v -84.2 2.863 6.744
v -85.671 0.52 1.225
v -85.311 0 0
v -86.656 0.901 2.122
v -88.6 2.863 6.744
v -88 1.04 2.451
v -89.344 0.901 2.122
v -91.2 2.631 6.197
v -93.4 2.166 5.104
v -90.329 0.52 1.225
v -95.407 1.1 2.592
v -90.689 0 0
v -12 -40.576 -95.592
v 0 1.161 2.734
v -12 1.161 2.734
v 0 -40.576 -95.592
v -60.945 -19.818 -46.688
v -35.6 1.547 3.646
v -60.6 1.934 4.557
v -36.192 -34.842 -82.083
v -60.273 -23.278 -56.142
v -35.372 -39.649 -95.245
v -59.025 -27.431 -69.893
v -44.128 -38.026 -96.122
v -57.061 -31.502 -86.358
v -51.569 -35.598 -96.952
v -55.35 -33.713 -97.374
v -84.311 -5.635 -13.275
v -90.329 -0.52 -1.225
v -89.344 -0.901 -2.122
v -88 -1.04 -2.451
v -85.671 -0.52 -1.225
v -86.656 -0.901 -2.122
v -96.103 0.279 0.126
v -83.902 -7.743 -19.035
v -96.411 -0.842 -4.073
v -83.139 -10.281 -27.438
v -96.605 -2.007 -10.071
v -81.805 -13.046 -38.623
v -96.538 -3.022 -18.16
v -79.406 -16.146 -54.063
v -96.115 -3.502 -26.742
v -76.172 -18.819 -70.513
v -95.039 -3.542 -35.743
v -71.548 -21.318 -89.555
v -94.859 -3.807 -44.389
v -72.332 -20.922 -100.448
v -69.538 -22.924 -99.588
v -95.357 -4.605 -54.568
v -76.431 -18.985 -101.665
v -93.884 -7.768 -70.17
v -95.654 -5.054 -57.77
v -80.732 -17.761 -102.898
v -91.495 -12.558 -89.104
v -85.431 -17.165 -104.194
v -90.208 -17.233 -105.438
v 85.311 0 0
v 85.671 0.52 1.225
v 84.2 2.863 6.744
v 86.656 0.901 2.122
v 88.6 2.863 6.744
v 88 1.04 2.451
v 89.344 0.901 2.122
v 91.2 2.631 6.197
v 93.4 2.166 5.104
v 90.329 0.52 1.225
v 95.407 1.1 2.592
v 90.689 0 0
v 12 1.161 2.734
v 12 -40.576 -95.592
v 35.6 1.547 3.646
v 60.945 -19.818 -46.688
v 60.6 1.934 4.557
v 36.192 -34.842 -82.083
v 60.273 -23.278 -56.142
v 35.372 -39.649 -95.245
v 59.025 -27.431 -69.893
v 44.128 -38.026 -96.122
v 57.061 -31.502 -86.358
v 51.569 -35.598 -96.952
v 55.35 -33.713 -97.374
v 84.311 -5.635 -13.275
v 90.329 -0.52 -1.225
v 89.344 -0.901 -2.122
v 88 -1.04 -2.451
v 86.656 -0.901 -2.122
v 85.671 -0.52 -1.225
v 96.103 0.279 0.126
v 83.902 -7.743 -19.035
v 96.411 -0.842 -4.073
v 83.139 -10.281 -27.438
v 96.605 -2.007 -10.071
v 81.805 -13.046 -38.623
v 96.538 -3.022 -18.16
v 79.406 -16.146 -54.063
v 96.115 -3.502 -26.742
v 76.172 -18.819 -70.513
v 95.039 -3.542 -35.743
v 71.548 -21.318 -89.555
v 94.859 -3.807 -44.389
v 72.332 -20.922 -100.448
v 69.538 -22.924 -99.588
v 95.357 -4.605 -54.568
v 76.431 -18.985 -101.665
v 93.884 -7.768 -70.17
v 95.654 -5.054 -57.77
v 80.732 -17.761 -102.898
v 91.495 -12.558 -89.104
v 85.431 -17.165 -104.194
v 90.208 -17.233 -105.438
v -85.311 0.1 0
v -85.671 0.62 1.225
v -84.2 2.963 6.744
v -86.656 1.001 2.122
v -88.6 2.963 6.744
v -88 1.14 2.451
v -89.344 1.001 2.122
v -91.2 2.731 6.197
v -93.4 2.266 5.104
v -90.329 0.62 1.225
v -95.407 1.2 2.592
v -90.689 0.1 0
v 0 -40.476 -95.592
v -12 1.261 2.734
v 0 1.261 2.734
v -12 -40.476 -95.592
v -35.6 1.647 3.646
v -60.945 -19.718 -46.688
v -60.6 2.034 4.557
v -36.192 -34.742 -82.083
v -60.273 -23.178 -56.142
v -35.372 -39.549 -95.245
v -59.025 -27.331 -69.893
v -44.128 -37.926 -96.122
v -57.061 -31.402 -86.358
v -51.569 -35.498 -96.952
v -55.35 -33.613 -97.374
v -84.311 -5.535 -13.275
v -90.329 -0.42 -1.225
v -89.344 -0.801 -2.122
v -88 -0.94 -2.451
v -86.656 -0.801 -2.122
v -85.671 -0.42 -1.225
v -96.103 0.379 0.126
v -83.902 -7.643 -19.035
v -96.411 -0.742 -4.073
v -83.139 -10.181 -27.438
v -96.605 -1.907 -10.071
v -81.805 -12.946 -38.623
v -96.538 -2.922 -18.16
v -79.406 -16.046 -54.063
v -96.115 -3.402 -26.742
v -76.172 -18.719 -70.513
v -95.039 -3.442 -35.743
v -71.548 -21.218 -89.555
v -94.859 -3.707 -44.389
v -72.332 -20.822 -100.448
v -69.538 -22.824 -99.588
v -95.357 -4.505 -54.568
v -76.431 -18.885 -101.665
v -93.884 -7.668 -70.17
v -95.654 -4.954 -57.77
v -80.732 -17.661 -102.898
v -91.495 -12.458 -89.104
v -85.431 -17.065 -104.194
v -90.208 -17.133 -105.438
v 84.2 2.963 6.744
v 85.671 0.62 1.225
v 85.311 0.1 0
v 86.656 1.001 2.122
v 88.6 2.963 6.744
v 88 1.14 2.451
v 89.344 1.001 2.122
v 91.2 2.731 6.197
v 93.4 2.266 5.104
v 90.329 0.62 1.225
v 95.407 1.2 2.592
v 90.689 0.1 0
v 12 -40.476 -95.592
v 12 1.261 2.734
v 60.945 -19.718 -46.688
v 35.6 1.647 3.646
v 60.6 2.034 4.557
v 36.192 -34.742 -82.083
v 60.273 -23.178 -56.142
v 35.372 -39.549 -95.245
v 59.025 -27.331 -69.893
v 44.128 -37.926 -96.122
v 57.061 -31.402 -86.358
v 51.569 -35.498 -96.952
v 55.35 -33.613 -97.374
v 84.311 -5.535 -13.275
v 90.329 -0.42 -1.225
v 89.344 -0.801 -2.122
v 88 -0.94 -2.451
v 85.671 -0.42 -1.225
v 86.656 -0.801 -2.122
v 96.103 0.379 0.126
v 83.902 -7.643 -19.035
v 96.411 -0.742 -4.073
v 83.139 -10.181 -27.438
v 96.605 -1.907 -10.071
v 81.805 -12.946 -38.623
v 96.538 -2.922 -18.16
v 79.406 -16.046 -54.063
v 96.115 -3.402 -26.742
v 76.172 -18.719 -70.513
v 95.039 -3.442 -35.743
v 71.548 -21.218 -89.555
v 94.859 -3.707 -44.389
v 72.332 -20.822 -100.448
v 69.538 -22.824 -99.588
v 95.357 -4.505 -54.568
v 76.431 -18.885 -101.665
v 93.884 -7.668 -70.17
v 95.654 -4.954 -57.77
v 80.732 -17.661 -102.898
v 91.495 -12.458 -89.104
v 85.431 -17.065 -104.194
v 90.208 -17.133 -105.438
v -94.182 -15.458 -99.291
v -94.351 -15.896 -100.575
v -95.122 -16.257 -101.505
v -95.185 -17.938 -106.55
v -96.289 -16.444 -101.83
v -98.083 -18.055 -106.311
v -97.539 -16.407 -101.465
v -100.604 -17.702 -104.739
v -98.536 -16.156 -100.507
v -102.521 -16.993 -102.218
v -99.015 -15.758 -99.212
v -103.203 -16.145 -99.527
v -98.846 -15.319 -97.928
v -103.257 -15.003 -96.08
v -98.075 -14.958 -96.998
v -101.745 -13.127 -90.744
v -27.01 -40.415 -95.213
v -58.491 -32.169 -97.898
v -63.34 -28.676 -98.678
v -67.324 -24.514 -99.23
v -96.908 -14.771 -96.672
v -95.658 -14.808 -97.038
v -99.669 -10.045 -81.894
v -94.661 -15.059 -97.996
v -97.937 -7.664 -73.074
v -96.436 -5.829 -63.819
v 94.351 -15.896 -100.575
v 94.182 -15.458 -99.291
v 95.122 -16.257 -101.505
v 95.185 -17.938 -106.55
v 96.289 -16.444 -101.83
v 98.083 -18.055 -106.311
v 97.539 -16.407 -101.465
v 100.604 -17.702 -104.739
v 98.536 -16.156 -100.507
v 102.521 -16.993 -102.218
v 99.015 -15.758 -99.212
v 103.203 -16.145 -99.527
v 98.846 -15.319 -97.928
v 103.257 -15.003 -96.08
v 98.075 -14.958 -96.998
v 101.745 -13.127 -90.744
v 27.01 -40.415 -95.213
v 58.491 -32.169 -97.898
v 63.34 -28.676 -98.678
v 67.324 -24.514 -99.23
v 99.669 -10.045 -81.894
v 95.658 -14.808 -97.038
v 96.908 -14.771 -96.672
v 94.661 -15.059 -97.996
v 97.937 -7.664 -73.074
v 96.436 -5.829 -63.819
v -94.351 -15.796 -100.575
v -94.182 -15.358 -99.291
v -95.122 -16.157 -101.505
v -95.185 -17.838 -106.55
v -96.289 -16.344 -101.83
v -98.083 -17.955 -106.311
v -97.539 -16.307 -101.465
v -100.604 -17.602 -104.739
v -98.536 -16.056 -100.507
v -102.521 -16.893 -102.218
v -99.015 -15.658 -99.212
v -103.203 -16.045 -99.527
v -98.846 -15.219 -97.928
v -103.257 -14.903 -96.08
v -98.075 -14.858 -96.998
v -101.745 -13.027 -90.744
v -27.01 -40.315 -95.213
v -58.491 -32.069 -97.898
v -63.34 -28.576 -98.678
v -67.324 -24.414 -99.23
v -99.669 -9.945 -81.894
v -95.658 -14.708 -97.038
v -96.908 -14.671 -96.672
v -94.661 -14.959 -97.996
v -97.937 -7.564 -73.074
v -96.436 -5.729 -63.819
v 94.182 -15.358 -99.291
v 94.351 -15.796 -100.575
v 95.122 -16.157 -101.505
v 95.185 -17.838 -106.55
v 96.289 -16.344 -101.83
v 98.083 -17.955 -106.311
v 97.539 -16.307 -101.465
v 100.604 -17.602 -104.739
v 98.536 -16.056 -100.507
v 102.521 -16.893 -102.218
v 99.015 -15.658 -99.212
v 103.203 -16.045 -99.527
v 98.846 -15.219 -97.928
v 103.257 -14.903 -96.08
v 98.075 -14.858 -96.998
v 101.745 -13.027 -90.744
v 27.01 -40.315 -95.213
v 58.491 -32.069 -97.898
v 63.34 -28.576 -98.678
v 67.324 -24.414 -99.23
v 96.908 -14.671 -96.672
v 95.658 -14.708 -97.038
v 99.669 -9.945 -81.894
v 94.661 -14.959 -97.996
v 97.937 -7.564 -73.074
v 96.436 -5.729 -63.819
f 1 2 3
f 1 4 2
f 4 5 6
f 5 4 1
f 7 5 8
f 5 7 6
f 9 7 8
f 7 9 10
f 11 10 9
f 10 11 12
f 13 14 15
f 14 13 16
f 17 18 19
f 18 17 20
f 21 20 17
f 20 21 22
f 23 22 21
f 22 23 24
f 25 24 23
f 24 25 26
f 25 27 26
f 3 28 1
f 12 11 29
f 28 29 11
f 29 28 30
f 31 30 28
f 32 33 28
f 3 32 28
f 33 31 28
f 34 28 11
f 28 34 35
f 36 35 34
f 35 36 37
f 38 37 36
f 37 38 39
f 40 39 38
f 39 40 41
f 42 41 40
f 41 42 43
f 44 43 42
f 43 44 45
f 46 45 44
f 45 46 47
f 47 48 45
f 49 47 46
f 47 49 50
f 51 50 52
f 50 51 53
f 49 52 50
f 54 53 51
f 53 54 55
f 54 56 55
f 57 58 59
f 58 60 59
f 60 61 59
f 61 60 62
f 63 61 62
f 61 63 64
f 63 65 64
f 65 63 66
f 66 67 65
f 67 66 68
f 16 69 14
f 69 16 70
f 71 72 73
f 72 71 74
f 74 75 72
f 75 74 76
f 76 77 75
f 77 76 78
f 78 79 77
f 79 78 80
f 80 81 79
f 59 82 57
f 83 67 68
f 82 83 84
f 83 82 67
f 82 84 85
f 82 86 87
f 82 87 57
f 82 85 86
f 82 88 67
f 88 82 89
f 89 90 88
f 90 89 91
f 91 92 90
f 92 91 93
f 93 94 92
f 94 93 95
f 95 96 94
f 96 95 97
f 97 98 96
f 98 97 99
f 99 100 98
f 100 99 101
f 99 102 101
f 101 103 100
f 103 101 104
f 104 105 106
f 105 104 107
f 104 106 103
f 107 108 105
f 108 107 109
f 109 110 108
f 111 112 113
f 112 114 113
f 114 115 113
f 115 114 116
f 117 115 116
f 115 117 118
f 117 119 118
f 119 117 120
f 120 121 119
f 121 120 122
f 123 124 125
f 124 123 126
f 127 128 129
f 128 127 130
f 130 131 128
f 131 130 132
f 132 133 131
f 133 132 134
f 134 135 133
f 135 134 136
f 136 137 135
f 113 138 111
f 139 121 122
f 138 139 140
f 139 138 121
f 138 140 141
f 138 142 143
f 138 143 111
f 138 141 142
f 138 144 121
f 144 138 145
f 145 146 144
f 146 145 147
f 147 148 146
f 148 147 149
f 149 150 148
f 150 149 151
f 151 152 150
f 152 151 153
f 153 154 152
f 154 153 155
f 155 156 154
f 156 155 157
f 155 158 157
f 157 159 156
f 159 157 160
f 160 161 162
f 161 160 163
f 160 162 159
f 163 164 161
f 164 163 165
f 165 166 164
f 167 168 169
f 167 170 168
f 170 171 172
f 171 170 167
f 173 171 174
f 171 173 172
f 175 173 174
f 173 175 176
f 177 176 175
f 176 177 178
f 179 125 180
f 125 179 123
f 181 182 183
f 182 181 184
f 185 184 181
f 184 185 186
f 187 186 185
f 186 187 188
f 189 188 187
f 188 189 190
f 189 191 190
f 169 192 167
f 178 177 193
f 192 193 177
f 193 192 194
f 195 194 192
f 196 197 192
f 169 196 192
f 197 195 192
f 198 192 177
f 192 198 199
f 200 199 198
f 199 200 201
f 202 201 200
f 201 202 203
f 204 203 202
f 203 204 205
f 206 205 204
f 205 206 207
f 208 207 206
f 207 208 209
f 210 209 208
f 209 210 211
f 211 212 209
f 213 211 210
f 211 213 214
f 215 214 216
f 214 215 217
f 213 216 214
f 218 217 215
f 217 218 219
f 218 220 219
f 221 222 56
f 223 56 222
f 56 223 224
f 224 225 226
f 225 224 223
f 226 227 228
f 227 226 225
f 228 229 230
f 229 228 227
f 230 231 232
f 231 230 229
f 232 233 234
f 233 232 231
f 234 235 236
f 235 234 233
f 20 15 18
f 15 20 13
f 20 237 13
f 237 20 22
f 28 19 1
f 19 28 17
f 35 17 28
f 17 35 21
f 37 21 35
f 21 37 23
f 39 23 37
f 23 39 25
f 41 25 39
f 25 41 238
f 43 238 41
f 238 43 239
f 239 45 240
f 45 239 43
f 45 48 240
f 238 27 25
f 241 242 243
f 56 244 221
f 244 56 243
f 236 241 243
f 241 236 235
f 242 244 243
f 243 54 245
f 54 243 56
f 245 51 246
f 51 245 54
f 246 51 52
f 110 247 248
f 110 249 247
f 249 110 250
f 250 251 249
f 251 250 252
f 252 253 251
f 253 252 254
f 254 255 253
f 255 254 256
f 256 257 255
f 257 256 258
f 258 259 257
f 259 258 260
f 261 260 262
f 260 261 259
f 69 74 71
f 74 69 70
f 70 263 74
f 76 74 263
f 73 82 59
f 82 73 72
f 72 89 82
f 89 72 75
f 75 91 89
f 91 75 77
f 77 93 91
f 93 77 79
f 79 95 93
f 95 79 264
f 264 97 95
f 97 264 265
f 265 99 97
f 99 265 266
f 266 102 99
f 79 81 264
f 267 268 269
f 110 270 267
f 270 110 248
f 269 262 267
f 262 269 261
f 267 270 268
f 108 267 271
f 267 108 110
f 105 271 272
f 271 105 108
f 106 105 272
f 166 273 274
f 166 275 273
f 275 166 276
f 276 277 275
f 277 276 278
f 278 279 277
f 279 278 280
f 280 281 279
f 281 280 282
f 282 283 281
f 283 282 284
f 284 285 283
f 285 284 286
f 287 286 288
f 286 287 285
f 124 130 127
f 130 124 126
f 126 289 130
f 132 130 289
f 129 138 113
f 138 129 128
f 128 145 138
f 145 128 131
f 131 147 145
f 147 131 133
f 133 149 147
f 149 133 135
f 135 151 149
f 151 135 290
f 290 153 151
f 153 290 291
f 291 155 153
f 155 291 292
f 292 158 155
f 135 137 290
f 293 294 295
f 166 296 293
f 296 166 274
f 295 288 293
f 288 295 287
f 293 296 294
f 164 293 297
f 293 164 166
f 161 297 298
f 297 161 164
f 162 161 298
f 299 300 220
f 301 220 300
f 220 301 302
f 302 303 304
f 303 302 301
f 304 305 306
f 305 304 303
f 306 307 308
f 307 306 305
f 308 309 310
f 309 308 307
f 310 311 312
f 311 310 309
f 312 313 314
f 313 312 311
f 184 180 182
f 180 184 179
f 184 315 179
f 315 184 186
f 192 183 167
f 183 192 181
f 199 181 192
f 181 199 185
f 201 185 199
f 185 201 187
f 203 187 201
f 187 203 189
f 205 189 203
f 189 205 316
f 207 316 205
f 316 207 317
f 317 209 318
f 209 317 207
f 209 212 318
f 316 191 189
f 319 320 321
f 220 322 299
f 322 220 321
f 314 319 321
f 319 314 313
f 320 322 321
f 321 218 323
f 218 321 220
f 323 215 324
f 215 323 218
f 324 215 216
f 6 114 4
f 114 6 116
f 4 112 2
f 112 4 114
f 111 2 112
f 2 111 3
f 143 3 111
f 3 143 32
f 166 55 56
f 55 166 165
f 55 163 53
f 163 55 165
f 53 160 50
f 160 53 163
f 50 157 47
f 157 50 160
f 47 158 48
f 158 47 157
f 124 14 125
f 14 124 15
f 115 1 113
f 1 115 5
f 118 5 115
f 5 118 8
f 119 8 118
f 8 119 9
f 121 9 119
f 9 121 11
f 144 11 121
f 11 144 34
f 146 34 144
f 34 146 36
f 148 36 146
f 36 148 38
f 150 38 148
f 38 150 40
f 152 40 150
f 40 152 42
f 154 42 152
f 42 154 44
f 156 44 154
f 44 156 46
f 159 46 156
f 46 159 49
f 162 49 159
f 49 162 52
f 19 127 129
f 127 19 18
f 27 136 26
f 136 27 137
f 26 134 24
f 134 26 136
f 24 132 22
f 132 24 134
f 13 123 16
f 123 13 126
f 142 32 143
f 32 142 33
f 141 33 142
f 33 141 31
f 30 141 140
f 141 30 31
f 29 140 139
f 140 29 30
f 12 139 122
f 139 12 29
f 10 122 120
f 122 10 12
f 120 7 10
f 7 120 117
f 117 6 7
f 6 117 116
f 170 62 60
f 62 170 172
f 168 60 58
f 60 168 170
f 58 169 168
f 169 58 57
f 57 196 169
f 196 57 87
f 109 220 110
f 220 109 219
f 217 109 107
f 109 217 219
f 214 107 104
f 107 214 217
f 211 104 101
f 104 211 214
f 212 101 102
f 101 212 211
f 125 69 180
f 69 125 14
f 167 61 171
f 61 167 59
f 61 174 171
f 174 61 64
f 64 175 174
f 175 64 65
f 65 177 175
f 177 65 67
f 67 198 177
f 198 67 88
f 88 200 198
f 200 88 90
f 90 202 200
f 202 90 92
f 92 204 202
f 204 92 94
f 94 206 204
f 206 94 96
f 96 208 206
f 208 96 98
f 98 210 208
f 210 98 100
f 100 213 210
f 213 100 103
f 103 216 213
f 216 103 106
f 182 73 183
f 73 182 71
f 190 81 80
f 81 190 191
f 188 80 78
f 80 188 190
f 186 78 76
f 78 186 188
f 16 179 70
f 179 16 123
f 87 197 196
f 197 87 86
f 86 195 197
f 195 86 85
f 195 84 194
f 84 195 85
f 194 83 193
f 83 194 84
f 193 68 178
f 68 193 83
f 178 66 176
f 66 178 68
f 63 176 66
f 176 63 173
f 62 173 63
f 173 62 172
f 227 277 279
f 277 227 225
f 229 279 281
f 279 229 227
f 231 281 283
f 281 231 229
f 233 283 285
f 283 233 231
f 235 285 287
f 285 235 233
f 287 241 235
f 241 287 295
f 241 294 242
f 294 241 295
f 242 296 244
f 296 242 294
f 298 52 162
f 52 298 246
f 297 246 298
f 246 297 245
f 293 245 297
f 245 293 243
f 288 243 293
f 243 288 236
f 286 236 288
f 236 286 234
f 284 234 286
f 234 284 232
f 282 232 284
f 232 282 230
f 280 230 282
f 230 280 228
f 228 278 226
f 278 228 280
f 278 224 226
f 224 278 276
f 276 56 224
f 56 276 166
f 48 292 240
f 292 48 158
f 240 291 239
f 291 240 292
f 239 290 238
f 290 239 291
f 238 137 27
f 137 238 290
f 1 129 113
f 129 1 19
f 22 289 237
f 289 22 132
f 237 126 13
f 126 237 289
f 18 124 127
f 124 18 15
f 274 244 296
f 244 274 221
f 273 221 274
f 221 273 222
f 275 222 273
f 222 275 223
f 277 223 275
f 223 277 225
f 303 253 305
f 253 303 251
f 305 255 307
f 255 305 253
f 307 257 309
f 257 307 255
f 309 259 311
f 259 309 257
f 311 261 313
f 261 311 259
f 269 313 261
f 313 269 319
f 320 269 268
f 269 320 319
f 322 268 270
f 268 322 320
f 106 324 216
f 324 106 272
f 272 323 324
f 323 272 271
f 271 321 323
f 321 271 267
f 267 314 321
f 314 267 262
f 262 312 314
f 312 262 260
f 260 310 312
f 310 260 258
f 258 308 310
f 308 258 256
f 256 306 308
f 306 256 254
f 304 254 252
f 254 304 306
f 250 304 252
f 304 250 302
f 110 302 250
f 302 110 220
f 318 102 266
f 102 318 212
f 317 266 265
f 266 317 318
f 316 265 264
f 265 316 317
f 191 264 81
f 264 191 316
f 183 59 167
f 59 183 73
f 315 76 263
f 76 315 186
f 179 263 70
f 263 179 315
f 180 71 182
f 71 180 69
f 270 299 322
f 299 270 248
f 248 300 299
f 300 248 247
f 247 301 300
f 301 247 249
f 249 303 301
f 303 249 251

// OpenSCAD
// file: ../p/rect2p.scad
use <../lib.scad>
function ldraw_lib__rect2p() = [
// 0 Rectangle with 2 Parallel Edges
// 0 Name: rect2p.dat
// 0 Author: Donald Sutter [technog]
// 0 !LDRAW_ORG Primitive UPDATE 2010-01
// 0 !LICENSE Licensed under CC BY 2.0 and CC BY 4.0 : see CAreadme.txt
// 
// 0 BFC CERTIFY CCW
  [0,"BFC","CERTIFY"],
  [0,"BFC","CCW"],
// 
// 0 !HISTORY 2003-08-01 [PTadmin] Official Update 2003-02
// 0 !HISTORY 2007-06-24 [PTadmin] Header formatted for Contributor Agreement
// 0 !HISTORY 2008-07-01 [PTadmin] Official Update 2008-01
// 0 !HISTORY 2010-01-17 [mikeheide] changed winding to CCW
// 0 !HISTORY 2010-04-05 [PTadmin] Official Update 2010-01
// 
// 
// 2 24 1 0 1 -1 0 1
  [2,24,1,0,1,-1,0,1],
// 2 24 -1 0 -1 1 0 -1
  [2,24,-1,0,-1,1,0,-1],
// 4 16 -1 0 1 -1 0 -1 1 0 -1 1 0 1
  [4,16,-1,0,1,-1,0,-1,1,0,-1,1,0,1],
// 0
];
module ldraw_lib__rect2p(step=0, col=false, unit=2/5, alt=false, line=0.2, solid=!$preview)
    makepoly(ldraw_lib__rect2p(), step=step, col=col, unit=unit, alt=alt, line=line, solid=solid);
ldraw_lib__rect2p(line=0.2);
// main file
use <../lib.scad>
use <s/u9495c02s01.scad>
use <s/u9495c02s02.scad>
use <s/u9495c02s03.scad>
use <s/u9495c02s04.scad>
function ldraw_lib__u9495c02() = [
// 0 Sail 30 x 15 Trapezoidal (Formed Shape 2)
// 0 Name: u9495c02.dat
// 0 Author: Philippe Hurbain [Philo]
// 0 !LDRAW_ORG Part UPDATE 2020-03
// 0 !LICENSE Licensed under CC BY 2.0 and CC BY 4.0 : see CAreadme.txt
// 
// 0 BFC CERTIFY CCW
  [0,"BFC","CERTIFY"],
  [0,"BFC","CCW"],
// 
// 0 !CATEGORY Sheet Fabric
// 
// 0 !HISTORY 2020-12-29 [PTadmin] Official Update 2020-03
// 
// 
// 1 16 0 0 0 1 0 0 0 1 0 0 0 1 s\u9495c02s01.dat
  [1,16,0,0,0,1,0,0,0,1,0,0,0,1, ldraw_lib__s__u9495c02s01()],
// 1 16 0 0 0 -1 0 0 0 1 0 0 0 1 s\u9495c02s01.dat
  [1,16,0,0,0,-1,0,0,0,1,0,0,0,1, ldraw_lib__s__u9495c02s01()],
// 0 BFC INVERTNEXT
  [0,"BFC","INVERTNEXT"],
// 1 16 0 0 0.25 1 0 0 0 1 0 0 0 1 s\u9495c02s01.dat
  [1,16,0,0,0.25,1,0,0,0,1,0,0,0,1, ldraw_lib__s__u9495c02s01()],
// 0 BFC INVERTNEXT
  [0,"BFC","INVERTNEXT"],
// 1 16 0 0 0.25 -1 0 0 0 1 0 0 0 1 s\u9495c02s01.dat
  [1,16,0,0,0.25,-1,0,0,0,1,0,0,0,1, ldraw_lib__s__u9495c02s01()],
// 
// 1 16 0 0 0 1 0 0 0 1 0 0 0 1 s\u9495c02s02.dat
  [1,16,0,0,0,1,0,0,0,1,0,0,0,1, ldraw_lib__s__u9495c02s02()],
// 1 16 0 0 0 -1 0 0 0 1 0 0 0 1 s\u9495c02s02.dat
  [1,16,0,0,0,-1,0,0,0,1,0,0,0,1, ldraw_lib__s__u9495c02s02()],
// 0 BFC INVERTNEXT
  [0,"BFC","INVERTNEXT"],
// 1 16 0 0 0.25 1 0 0 0 1 0 0 0 1 s\u9495c02s02.dat
  [1,16,0,0,0.25,1,0,0,0,1,0,0,0,1, ldraw_lib__s__u9495c02s02()],
// 0 BFC INVERTNEXT
  [0,"BFC","INVERTNEXT"],
// 1 16 0 0 0.25 -1 0 0 0 1 0 0 0 1 s\u9495c02s02.dat
  [1,16,0,0,0.25,-1,0,0,0,1,0,0,0,1, ldraw_lib__s__u9495c02s02()],
// 
// 1 16 0 0 0 1 0 0 0 1 0 0 0 1 s\u9495c02s03.dat
  [1,16,0,0,0,1,0,0,0,1,0,0,0,1, ldraw_lib__s__u9495c02s03()],
// 1 16 0 0 0 -1 0 0 0 1 0 0 0 1 s\u9495c02s03.dat
  [1,16,0,0,0,-1,0,0,0,1,0,0,0,1, ldraw_lib__s__u9495c02s03()],
// 
// 1 16 0 0 0 1 0 0 0 1 0 0 0 1 s\u9495c02s04.dat
  [1,16,0,0,0,1,0,0,0,1,0,0,0,1, ldraw_lib__s__u9495c02s04()],
// 1 16 0 0 0 -1 0 0 0 1 0 0 0 1 s\u9495c02s04.dat
  [1,16,0,0,0,-1,0,0,0,1,0,0,0,1, ldraw_lib__s__u9495c02s04()],
];
module ldraw_lib__u9495c02(step=0, col=false, unit=2/5, alt=false, line=0.2, solid=!$preview)
    makepoly(ldraw_lib__u9495c02(), step=step, col=col, unit=unit, alt=alt, line=line, solid=solid);
ldraw_lib__u9495c02(line=0.2);
